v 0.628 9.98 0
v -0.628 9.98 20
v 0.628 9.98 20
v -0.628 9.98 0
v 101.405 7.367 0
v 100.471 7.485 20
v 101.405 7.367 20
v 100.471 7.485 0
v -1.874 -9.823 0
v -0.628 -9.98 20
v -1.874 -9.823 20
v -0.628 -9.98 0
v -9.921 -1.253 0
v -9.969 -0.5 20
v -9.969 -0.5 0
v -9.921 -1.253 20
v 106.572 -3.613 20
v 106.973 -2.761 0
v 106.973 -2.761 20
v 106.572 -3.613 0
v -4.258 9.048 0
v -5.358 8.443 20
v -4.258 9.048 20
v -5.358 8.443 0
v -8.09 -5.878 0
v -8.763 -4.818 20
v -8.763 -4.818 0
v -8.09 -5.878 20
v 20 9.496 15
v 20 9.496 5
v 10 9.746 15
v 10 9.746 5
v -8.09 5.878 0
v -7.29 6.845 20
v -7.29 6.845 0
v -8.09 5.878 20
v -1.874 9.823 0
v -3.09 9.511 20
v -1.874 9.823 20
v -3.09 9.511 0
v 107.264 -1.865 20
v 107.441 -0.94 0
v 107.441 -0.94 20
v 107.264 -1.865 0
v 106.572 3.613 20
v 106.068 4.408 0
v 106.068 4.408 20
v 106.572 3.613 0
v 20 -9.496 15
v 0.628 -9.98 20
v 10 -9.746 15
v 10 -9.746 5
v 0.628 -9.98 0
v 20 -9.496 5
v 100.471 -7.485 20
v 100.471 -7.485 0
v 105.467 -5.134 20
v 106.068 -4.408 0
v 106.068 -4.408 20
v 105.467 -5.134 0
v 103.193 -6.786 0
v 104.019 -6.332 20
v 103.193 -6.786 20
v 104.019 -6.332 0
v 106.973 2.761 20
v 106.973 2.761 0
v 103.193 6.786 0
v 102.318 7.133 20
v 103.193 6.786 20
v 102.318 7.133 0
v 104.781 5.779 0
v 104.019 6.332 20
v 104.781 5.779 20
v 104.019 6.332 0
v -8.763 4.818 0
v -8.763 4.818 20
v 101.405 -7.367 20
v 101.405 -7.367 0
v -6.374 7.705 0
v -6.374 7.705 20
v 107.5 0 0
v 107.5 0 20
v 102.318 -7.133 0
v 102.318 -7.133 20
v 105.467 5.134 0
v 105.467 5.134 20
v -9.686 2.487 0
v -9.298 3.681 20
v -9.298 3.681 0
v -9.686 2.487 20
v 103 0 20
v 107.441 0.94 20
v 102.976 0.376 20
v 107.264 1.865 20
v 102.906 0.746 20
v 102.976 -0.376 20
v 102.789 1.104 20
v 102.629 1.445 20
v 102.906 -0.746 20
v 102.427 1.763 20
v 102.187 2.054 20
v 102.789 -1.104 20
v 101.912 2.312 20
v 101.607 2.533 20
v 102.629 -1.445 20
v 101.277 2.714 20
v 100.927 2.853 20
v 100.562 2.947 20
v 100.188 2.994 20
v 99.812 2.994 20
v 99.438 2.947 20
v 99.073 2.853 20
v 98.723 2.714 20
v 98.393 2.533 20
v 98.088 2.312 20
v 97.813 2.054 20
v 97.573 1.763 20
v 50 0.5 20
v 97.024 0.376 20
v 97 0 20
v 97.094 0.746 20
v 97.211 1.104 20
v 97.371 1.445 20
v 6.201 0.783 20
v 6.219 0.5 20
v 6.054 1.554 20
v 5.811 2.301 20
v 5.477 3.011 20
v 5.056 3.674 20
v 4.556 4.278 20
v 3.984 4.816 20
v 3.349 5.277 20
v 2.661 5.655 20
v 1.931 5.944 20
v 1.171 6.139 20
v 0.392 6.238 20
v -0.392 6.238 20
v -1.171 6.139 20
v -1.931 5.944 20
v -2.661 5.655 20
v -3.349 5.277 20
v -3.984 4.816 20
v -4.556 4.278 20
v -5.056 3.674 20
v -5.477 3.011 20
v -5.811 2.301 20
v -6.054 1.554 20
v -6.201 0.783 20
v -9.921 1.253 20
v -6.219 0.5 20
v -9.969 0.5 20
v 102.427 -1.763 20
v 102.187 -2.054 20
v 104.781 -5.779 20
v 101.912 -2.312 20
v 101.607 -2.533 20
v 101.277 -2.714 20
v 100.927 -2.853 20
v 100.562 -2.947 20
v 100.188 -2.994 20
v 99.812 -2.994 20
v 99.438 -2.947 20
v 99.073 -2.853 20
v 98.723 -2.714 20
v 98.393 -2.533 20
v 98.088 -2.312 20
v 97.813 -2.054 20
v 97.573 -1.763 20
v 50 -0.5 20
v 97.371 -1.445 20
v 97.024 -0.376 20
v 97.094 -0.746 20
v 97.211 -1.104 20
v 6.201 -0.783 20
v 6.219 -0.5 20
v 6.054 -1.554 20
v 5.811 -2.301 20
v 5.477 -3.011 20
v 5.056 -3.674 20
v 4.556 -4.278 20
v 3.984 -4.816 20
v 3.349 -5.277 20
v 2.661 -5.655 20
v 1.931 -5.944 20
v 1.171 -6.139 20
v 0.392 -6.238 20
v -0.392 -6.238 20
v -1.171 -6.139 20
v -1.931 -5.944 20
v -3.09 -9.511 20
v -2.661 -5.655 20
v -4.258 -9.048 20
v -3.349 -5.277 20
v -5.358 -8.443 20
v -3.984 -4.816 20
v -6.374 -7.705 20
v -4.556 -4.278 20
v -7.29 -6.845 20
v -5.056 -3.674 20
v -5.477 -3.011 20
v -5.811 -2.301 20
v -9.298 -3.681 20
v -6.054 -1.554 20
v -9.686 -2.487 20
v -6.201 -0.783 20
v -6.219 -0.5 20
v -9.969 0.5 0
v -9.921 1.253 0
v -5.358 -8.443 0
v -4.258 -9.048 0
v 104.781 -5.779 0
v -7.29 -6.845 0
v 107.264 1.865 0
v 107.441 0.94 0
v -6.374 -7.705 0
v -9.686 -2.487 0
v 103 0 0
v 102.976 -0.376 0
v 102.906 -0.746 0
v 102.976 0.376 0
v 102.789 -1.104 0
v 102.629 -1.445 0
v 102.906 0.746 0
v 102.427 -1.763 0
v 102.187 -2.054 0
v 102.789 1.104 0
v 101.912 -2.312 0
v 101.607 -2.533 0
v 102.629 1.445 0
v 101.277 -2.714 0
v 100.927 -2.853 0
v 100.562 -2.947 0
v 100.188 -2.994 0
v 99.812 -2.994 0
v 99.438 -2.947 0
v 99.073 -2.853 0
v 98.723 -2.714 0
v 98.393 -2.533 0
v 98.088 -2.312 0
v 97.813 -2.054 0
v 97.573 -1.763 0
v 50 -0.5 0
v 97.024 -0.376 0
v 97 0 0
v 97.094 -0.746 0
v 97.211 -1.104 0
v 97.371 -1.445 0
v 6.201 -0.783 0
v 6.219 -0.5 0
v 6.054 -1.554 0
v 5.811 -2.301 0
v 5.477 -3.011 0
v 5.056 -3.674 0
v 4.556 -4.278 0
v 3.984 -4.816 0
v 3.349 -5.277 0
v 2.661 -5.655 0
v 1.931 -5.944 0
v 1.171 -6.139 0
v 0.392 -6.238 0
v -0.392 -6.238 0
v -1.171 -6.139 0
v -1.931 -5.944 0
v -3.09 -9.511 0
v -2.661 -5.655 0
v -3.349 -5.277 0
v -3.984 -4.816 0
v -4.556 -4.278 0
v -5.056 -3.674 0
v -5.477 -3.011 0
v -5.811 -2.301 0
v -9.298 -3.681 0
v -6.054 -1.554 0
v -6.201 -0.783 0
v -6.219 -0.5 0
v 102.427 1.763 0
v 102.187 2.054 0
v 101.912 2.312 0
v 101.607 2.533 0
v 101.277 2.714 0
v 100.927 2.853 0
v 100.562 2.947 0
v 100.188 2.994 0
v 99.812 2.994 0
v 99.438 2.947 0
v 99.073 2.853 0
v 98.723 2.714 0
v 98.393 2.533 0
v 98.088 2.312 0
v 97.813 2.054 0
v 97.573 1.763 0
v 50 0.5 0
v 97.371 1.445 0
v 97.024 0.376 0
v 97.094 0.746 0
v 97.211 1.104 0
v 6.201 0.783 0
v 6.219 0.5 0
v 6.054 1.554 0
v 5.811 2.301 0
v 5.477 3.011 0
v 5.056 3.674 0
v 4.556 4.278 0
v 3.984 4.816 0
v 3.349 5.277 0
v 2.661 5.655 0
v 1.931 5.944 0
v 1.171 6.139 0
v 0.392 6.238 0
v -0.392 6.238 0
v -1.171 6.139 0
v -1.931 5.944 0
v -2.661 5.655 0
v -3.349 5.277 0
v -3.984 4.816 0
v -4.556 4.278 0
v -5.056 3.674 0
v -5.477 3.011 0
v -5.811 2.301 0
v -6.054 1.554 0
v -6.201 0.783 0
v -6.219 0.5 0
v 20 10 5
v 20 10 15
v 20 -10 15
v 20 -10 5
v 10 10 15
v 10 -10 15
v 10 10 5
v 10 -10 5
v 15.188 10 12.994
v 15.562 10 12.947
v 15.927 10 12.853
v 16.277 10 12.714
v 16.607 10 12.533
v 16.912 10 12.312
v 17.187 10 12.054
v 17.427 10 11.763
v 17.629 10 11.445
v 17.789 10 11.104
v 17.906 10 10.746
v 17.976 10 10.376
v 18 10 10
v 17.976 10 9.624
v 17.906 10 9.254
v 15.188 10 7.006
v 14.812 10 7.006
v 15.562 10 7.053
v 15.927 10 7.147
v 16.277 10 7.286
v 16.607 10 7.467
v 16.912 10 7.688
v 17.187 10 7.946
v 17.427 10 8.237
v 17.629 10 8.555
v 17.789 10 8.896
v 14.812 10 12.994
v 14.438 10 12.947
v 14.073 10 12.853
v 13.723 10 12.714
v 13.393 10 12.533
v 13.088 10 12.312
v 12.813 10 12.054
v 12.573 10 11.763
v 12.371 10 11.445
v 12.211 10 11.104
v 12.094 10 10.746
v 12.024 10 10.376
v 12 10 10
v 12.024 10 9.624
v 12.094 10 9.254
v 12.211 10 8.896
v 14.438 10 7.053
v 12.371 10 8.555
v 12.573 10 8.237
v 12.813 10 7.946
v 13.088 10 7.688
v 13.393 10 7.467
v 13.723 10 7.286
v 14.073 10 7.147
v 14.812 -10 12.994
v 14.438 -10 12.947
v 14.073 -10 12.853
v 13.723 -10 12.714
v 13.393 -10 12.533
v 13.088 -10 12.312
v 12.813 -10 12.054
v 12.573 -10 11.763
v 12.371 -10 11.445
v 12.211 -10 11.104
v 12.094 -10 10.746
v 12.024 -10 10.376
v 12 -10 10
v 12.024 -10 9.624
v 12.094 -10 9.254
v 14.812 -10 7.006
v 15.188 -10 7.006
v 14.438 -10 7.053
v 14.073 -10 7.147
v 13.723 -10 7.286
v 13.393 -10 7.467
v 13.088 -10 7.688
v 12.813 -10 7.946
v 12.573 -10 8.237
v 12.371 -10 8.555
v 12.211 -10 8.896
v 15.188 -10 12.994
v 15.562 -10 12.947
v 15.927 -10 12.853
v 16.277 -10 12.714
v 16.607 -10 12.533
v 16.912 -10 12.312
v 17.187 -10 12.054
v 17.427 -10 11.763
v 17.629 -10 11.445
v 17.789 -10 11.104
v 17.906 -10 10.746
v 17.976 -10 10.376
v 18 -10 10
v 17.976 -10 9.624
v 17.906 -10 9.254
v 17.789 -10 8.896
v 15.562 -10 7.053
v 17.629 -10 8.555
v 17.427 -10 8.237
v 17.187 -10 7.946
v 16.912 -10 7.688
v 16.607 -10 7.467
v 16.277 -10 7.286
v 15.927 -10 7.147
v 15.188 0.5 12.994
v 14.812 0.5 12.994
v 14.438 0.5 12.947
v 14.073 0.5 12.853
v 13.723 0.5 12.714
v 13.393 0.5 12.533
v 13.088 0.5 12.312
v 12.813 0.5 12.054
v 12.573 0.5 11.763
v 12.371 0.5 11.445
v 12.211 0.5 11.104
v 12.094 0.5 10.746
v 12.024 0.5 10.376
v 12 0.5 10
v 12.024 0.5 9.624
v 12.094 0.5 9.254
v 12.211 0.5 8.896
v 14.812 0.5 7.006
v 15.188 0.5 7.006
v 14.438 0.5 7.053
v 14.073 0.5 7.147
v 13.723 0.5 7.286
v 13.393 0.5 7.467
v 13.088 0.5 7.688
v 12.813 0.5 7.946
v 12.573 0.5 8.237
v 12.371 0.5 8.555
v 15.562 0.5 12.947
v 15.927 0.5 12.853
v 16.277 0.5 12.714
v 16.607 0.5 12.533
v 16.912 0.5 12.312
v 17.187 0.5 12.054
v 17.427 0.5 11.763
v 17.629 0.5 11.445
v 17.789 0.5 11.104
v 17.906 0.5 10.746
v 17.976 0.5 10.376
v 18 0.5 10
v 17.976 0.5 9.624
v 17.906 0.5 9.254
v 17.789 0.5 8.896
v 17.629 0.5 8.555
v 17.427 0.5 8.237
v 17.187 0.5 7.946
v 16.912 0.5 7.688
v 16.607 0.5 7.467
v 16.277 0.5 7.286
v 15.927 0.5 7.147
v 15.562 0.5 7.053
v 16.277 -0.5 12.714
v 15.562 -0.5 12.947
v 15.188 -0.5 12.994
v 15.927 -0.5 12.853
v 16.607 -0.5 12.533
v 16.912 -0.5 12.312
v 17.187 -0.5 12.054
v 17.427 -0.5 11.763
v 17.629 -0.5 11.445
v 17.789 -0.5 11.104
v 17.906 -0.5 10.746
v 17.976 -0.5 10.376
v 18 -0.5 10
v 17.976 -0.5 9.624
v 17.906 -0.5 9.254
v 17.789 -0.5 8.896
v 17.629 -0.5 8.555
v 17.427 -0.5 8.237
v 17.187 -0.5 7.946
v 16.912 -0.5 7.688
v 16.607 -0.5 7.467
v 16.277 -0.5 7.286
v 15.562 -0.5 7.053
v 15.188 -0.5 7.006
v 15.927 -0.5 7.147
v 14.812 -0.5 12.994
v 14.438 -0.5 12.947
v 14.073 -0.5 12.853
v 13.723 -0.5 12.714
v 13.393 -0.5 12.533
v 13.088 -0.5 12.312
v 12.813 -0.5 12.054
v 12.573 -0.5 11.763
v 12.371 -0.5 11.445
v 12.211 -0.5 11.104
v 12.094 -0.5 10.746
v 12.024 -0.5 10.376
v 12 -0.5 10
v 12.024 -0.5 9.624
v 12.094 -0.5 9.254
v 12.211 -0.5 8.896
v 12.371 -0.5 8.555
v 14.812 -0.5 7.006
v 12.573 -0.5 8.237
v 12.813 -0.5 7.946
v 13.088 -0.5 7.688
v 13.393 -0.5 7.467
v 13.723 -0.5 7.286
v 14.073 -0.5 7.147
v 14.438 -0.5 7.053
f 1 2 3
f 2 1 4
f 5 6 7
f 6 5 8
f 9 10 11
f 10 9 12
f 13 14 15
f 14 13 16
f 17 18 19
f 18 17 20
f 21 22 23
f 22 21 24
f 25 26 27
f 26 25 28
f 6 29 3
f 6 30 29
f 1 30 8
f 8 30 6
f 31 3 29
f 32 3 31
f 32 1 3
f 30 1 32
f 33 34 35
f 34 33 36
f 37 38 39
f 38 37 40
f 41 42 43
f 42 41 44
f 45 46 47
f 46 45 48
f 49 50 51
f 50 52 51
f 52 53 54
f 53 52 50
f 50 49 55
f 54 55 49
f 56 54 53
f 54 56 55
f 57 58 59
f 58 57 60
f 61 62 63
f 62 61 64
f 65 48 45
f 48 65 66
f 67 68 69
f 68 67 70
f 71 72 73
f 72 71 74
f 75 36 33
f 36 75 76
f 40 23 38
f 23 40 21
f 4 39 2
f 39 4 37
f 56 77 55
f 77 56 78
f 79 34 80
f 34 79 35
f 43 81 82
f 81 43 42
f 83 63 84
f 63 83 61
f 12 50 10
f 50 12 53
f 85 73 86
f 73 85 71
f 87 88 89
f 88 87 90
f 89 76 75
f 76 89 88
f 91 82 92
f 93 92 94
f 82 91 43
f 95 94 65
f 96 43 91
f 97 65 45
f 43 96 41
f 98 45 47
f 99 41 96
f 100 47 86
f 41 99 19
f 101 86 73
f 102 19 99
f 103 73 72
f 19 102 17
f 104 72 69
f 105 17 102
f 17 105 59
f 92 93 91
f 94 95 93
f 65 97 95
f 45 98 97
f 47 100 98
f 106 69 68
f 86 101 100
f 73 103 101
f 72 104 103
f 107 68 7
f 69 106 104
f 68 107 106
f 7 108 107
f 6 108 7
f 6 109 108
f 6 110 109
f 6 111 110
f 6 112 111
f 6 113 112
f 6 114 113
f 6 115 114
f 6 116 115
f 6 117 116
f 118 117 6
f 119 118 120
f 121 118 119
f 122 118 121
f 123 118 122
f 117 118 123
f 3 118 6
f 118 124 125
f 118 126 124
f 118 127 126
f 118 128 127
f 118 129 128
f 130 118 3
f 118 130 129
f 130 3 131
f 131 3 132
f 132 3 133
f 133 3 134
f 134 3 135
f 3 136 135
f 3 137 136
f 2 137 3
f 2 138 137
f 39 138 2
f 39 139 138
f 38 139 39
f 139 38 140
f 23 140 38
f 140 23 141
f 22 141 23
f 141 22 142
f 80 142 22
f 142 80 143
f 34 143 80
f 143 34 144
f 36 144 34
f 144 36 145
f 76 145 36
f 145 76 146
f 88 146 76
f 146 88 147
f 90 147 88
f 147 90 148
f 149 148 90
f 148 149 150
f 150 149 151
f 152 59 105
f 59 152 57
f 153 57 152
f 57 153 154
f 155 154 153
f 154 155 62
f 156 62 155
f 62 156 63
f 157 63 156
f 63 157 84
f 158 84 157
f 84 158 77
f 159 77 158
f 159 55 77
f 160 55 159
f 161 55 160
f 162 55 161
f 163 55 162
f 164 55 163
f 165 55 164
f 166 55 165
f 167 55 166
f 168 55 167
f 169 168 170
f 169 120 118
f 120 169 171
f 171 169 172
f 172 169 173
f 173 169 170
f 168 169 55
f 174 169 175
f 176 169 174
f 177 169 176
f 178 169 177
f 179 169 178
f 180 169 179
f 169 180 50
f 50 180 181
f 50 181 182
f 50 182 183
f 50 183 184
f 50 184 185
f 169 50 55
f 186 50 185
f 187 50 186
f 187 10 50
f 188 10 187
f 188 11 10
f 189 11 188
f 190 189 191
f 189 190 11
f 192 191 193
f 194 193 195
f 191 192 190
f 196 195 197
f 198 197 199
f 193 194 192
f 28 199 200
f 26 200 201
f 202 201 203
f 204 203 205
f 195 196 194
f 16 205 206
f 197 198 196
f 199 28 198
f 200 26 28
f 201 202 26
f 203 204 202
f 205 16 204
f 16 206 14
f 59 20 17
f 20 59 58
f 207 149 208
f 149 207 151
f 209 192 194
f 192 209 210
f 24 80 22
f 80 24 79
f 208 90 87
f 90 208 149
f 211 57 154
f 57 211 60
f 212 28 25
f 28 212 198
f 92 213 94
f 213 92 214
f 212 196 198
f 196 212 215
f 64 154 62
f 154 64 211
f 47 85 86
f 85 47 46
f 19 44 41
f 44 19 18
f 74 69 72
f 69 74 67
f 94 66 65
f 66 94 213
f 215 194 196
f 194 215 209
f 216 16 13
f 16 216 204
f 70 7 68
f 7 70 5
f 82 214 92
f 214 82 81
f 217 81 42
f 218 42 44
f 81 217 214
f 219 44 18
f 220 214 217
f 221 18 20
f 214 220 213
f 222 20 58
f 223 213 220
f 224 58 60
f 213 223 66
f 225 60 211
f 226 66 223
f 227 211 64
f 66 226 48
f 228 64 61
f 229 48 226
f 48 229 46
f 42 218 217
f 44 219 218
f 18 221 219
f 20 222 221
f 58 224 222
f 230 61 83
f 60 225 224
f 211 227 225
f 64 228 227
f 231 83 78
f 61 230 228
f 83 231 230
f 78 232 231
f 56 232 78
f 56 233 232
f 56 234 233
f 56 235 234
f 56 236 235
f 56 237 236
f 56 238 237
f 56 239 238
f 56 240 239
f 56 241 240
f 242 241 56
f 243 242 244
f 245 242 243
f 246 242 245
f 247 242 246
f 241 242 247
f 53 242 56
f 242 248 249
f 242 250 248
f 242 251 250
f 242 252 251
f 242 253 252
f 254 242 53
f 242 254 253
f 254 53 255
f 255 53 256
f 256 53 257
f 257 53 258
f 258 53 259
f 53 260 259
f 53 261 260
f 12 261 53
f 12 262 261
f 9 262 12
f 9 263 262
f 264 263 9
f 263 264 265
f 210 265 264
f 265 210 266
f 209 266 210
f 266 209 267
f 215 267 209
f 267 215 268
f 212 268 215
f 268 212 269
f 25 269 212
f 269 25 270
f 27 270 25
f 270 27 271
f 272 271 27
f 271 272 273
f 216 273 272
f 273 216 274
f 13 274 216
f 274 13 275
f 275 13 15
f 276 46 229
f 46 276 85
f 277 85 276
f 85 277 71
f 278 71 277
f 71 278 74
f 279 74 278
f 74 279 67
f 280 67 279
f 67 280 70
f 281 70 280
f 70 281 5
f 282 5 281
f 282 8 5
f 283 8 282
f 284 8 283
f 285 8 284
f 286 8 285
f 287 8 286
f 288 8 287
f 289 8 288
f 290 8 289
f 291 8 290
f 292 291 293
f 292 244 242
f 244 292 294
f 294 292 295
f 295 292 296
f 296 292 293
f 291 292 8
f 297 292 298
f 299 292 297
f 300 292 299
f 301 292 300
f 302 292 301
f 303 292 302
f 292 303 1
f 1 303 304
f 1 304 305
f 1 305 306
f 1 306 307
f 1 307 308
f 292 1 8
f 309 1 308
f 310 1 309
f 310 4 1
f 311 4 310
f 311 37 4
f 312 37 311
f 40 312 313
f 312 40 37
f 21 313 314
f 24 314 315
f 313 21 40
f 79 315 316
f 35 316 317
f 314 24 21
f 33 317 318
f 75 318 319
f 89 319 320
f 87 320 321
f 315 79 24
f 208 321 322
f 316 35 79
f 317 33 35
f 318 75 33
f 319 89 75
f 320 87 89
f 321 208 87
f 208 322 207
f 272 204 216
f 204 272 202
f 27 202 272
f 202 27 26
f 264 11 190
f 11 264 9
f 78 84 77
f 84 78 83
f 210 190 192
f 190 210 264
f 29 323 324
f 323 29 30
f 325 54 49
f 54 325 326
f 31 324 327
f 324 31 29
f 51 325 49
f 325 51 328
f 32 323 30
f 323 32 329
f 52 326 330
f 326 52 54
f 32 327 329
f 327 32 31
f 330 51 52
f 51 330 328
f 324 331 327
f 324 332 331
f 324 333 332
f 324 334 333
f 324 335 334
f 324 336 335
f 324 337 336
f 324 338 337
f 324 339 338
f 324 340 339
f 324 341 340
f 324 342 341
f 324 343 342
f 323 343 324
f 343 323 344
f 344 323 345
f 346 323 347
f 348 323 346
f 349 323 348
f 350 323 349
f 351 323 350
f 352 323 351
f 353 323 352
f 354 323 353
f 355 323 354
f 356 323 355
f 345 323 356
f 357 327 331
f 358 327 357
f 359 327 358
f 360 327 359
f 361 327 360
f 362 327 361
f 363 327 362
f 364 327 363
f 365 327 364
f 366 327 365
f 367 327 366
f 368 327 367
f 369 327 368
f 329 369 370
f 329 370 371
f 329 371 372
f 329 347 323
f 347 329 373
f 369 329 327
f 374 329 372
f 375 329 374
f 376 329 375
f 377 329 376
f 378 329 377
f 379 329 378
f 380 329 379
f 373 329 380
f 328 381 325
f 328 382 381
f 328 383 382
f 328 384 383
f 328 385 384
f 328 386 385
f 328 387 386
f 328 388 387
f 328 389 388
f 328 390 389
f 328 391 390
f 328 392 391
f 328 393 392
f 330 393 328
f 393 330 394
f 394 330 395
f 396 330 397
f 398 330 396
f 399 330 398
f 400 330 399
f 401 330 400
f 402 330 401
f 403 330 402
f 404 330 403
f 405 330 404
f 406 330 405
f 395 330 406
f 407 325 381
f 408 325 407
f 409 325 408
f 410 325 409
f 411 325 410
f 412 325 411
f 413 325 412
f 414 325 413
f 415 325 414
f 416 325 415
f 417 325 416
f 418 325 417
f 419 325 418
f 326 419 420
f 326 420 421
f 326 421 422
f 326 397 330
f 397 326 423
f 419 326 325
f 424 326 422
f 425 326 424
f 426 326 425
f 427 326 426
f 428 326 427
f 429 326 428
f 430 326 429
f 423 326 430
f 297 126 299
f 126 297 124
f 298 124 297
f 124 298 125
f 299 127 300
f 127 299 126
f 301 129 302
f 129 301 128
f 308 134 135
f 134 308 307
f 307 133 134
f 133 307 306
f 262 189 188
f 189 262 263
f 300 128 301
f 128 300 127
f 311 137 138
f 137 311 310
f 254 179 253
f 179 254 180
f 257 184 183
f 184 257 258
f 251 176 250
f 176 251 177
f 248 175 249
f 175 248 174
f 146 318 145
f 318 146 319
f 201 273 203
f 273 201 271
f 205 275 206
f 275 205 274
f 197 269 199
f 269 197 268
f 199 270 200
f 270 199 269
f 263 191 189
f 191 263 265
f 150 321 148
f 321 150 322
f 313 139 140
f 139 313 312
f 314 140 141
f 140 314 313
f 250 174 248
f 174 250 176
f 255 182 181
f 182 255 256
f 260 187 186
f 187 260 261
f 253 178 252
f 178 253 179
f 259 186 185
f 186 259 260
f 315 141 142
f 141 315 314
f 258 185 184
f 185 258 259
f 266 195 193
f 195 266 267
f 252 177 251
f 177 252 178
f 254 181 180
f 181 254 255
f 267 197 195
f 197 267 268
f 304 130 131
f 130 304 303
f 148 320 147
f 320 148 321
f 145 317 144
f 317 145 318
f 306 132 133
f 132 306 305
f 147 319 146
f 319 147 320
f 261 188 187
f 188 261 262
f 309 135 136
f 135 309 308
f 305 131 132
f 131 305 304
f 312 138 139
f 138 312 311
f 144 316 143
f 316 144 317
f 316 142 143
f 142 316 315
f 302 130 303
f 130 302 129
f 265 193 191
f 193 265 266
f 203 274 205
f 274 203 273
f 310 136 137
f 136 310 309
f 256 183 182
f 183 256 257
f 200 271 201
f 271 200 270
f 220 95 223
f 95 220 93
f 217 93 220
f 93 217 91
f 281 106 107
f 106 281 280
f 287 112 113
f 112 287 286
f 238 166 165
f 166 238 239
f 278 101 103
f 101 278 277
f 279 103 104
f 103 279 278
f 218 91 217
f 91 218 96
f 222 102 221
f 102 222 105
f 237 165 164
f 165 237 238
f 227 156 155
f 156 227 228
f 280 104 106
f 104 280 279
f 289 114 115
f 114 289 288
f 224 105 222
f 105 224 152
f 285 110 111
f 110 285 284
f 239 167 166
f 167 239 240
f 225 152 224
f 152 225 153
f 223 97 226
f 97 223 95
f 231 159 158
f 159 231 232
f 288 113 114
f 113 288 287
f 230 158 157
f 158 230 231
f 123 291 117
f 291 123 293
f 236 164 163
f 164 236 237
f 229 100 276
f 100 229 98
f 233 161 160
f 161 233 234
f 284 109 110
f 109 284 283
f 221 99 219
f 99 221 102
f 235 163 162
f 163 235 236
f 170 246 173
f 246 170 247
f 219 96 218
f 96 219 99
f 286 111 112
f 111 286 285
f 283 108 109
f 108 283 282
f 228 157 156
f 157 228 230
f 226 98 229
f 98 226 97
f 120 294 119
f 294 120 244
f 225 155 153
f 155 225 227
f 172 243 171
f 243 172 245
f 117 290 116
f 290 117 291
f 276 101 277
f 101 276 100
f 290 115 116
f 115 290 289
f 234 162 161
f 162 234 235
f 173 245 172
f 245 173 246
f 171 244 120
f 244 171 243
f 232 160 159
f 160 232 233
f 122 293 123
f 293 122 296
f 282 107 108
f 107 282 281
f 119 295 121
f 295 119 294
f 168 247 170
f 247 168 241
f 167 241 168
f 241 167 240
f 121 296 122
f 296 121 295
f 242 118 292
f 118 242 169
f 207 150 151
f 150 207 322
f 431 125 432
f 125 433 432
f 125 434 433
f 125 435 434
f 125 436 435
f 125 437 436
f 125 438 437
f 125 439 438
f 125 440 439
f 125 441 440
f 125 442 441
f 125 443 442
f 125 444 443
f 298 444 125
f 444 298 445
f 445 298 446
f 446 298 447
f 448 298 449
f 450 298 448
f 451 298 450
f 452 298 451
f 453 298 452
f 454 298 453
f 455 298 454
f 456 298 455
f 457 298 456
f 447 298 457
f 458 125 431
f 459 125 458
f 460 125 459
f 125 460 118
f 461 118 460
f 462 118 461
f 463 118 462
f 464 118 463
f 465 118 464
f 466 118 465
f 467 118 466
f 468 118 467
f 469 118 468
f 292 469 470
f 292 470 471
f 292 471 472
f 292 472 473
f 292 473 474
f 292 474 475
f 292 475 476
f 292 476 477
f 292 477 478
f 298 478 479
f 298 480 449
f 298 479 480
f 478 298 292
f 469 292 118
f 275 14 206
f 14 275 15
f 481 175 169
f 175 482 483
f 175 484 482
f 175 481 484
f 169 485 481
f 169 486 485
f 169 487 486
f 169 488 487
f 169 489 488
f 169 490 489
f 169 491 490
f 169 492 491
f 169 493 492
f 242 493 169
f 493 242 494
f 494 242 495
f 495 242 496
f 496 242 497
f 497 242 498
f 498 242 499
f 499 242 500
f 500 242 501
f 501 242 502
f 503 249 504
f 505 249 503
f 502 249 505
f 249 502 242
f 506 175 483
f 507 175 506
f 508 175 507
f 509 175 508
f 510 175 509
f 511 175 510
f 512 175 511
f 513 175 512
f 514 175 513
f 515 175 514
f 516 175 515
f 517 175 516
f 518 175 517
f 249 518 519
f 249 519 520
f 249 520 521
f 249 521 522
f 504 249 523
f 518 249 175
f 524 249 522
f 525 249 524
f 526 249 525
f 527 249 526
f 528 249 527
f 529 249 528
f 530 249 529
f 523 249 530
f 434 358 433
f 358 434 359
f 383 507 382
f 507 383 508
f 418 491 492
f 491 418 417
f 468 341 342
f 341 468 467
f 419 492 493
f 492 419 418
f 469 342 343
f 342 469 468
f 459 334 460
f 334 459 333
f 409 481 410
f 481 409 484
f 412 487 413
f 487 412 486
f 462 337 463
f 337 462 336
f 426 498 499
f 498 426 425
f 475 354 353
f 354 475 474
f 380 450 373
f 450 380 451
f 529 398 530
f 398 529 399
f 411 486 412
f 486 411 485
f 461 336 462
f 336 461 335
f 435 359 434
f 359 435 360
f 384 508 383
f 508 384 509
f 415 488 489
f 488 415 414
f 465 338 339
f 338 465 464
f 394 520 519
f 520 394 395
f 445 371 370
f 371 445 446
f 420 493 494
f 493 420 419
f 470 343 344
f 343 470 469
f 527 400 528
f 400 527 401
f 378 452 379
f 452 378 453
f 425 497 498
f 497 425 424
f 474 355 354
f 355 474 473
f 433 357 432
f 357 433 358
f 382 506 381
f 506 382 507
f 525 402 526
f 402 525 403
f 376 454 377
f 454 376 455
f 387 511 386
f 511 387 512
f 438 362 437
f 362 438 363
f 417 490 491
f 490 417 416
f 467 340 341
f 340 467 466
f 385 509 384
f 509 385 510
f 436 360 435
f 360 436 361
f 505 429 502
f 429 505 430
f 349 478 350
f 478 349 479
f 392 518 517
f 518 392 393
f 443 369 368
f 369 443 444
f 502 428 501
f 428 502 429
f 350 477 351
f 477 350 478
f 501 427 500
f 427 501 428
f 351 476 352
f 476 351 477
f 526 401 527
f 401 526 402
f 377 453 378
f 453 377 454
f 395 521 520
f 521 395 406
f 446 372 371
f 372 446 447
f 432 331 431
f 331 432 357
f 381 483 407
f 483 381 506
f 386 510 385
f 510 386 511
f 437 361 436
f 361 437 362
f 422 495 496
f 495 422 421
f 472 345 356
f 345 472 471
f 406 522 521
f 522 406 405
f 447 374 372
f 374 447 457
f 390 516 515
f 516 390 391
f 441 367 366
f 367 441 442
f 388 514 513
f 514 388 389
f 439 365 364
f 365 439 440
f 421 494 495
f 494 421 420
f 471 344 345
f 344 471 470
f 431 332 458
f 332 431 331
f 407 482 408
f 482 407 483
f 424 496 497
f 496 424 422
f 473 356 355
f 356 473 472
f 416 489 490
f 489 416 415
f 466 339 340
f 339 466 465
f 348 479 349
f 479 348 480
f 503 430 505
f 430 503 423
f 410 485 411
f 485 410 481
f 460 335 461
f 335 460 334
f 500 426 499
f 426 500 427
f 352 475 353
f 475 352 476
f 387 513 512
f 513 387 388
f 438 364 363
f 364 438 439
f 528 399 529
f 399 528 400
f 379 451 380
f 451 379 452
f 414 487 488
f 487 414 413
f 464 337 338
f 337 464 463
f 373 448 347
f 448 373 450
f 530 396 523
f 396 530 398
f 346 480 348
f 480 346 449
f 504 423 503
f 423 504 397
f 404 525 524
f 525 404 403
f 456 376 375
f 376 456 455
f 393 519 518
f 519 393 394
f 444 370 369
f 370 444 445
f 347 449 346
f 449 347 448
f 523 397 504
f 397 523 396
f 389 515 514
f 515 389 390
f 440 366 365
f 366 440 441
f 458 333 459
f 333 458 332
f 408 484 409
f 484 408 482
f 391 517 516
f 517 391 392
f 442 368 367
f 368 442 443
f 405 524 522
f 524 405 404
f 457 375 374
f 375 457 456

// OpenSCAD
// 3d-printable crank handle

$fn=50;
difference() {
  offset = 100;
  bolt_x = 15;
  union() {
    hull() {
      cylinder(d=20, h=20);
      translate([offset,0,0]) cylinder(d=15, h=20);
    }
    translate([bolt_x-5,-10,5]) cube([10,20,10]);
  }
  clearance = 0.5;
  translate([0,0,-1]) cylinder(d=12+clearance, h=22);
  translate([offset,0,-1]) cylinder(d=6, h=22);

  slot_width = 1;
  translate([-25,-slot_width/2,-1]) cube([75,slot_width, 22]);

  translate([bolt_x,20,10]) rotate([90,0,0]) cylinder(d=6,h=50);
}
